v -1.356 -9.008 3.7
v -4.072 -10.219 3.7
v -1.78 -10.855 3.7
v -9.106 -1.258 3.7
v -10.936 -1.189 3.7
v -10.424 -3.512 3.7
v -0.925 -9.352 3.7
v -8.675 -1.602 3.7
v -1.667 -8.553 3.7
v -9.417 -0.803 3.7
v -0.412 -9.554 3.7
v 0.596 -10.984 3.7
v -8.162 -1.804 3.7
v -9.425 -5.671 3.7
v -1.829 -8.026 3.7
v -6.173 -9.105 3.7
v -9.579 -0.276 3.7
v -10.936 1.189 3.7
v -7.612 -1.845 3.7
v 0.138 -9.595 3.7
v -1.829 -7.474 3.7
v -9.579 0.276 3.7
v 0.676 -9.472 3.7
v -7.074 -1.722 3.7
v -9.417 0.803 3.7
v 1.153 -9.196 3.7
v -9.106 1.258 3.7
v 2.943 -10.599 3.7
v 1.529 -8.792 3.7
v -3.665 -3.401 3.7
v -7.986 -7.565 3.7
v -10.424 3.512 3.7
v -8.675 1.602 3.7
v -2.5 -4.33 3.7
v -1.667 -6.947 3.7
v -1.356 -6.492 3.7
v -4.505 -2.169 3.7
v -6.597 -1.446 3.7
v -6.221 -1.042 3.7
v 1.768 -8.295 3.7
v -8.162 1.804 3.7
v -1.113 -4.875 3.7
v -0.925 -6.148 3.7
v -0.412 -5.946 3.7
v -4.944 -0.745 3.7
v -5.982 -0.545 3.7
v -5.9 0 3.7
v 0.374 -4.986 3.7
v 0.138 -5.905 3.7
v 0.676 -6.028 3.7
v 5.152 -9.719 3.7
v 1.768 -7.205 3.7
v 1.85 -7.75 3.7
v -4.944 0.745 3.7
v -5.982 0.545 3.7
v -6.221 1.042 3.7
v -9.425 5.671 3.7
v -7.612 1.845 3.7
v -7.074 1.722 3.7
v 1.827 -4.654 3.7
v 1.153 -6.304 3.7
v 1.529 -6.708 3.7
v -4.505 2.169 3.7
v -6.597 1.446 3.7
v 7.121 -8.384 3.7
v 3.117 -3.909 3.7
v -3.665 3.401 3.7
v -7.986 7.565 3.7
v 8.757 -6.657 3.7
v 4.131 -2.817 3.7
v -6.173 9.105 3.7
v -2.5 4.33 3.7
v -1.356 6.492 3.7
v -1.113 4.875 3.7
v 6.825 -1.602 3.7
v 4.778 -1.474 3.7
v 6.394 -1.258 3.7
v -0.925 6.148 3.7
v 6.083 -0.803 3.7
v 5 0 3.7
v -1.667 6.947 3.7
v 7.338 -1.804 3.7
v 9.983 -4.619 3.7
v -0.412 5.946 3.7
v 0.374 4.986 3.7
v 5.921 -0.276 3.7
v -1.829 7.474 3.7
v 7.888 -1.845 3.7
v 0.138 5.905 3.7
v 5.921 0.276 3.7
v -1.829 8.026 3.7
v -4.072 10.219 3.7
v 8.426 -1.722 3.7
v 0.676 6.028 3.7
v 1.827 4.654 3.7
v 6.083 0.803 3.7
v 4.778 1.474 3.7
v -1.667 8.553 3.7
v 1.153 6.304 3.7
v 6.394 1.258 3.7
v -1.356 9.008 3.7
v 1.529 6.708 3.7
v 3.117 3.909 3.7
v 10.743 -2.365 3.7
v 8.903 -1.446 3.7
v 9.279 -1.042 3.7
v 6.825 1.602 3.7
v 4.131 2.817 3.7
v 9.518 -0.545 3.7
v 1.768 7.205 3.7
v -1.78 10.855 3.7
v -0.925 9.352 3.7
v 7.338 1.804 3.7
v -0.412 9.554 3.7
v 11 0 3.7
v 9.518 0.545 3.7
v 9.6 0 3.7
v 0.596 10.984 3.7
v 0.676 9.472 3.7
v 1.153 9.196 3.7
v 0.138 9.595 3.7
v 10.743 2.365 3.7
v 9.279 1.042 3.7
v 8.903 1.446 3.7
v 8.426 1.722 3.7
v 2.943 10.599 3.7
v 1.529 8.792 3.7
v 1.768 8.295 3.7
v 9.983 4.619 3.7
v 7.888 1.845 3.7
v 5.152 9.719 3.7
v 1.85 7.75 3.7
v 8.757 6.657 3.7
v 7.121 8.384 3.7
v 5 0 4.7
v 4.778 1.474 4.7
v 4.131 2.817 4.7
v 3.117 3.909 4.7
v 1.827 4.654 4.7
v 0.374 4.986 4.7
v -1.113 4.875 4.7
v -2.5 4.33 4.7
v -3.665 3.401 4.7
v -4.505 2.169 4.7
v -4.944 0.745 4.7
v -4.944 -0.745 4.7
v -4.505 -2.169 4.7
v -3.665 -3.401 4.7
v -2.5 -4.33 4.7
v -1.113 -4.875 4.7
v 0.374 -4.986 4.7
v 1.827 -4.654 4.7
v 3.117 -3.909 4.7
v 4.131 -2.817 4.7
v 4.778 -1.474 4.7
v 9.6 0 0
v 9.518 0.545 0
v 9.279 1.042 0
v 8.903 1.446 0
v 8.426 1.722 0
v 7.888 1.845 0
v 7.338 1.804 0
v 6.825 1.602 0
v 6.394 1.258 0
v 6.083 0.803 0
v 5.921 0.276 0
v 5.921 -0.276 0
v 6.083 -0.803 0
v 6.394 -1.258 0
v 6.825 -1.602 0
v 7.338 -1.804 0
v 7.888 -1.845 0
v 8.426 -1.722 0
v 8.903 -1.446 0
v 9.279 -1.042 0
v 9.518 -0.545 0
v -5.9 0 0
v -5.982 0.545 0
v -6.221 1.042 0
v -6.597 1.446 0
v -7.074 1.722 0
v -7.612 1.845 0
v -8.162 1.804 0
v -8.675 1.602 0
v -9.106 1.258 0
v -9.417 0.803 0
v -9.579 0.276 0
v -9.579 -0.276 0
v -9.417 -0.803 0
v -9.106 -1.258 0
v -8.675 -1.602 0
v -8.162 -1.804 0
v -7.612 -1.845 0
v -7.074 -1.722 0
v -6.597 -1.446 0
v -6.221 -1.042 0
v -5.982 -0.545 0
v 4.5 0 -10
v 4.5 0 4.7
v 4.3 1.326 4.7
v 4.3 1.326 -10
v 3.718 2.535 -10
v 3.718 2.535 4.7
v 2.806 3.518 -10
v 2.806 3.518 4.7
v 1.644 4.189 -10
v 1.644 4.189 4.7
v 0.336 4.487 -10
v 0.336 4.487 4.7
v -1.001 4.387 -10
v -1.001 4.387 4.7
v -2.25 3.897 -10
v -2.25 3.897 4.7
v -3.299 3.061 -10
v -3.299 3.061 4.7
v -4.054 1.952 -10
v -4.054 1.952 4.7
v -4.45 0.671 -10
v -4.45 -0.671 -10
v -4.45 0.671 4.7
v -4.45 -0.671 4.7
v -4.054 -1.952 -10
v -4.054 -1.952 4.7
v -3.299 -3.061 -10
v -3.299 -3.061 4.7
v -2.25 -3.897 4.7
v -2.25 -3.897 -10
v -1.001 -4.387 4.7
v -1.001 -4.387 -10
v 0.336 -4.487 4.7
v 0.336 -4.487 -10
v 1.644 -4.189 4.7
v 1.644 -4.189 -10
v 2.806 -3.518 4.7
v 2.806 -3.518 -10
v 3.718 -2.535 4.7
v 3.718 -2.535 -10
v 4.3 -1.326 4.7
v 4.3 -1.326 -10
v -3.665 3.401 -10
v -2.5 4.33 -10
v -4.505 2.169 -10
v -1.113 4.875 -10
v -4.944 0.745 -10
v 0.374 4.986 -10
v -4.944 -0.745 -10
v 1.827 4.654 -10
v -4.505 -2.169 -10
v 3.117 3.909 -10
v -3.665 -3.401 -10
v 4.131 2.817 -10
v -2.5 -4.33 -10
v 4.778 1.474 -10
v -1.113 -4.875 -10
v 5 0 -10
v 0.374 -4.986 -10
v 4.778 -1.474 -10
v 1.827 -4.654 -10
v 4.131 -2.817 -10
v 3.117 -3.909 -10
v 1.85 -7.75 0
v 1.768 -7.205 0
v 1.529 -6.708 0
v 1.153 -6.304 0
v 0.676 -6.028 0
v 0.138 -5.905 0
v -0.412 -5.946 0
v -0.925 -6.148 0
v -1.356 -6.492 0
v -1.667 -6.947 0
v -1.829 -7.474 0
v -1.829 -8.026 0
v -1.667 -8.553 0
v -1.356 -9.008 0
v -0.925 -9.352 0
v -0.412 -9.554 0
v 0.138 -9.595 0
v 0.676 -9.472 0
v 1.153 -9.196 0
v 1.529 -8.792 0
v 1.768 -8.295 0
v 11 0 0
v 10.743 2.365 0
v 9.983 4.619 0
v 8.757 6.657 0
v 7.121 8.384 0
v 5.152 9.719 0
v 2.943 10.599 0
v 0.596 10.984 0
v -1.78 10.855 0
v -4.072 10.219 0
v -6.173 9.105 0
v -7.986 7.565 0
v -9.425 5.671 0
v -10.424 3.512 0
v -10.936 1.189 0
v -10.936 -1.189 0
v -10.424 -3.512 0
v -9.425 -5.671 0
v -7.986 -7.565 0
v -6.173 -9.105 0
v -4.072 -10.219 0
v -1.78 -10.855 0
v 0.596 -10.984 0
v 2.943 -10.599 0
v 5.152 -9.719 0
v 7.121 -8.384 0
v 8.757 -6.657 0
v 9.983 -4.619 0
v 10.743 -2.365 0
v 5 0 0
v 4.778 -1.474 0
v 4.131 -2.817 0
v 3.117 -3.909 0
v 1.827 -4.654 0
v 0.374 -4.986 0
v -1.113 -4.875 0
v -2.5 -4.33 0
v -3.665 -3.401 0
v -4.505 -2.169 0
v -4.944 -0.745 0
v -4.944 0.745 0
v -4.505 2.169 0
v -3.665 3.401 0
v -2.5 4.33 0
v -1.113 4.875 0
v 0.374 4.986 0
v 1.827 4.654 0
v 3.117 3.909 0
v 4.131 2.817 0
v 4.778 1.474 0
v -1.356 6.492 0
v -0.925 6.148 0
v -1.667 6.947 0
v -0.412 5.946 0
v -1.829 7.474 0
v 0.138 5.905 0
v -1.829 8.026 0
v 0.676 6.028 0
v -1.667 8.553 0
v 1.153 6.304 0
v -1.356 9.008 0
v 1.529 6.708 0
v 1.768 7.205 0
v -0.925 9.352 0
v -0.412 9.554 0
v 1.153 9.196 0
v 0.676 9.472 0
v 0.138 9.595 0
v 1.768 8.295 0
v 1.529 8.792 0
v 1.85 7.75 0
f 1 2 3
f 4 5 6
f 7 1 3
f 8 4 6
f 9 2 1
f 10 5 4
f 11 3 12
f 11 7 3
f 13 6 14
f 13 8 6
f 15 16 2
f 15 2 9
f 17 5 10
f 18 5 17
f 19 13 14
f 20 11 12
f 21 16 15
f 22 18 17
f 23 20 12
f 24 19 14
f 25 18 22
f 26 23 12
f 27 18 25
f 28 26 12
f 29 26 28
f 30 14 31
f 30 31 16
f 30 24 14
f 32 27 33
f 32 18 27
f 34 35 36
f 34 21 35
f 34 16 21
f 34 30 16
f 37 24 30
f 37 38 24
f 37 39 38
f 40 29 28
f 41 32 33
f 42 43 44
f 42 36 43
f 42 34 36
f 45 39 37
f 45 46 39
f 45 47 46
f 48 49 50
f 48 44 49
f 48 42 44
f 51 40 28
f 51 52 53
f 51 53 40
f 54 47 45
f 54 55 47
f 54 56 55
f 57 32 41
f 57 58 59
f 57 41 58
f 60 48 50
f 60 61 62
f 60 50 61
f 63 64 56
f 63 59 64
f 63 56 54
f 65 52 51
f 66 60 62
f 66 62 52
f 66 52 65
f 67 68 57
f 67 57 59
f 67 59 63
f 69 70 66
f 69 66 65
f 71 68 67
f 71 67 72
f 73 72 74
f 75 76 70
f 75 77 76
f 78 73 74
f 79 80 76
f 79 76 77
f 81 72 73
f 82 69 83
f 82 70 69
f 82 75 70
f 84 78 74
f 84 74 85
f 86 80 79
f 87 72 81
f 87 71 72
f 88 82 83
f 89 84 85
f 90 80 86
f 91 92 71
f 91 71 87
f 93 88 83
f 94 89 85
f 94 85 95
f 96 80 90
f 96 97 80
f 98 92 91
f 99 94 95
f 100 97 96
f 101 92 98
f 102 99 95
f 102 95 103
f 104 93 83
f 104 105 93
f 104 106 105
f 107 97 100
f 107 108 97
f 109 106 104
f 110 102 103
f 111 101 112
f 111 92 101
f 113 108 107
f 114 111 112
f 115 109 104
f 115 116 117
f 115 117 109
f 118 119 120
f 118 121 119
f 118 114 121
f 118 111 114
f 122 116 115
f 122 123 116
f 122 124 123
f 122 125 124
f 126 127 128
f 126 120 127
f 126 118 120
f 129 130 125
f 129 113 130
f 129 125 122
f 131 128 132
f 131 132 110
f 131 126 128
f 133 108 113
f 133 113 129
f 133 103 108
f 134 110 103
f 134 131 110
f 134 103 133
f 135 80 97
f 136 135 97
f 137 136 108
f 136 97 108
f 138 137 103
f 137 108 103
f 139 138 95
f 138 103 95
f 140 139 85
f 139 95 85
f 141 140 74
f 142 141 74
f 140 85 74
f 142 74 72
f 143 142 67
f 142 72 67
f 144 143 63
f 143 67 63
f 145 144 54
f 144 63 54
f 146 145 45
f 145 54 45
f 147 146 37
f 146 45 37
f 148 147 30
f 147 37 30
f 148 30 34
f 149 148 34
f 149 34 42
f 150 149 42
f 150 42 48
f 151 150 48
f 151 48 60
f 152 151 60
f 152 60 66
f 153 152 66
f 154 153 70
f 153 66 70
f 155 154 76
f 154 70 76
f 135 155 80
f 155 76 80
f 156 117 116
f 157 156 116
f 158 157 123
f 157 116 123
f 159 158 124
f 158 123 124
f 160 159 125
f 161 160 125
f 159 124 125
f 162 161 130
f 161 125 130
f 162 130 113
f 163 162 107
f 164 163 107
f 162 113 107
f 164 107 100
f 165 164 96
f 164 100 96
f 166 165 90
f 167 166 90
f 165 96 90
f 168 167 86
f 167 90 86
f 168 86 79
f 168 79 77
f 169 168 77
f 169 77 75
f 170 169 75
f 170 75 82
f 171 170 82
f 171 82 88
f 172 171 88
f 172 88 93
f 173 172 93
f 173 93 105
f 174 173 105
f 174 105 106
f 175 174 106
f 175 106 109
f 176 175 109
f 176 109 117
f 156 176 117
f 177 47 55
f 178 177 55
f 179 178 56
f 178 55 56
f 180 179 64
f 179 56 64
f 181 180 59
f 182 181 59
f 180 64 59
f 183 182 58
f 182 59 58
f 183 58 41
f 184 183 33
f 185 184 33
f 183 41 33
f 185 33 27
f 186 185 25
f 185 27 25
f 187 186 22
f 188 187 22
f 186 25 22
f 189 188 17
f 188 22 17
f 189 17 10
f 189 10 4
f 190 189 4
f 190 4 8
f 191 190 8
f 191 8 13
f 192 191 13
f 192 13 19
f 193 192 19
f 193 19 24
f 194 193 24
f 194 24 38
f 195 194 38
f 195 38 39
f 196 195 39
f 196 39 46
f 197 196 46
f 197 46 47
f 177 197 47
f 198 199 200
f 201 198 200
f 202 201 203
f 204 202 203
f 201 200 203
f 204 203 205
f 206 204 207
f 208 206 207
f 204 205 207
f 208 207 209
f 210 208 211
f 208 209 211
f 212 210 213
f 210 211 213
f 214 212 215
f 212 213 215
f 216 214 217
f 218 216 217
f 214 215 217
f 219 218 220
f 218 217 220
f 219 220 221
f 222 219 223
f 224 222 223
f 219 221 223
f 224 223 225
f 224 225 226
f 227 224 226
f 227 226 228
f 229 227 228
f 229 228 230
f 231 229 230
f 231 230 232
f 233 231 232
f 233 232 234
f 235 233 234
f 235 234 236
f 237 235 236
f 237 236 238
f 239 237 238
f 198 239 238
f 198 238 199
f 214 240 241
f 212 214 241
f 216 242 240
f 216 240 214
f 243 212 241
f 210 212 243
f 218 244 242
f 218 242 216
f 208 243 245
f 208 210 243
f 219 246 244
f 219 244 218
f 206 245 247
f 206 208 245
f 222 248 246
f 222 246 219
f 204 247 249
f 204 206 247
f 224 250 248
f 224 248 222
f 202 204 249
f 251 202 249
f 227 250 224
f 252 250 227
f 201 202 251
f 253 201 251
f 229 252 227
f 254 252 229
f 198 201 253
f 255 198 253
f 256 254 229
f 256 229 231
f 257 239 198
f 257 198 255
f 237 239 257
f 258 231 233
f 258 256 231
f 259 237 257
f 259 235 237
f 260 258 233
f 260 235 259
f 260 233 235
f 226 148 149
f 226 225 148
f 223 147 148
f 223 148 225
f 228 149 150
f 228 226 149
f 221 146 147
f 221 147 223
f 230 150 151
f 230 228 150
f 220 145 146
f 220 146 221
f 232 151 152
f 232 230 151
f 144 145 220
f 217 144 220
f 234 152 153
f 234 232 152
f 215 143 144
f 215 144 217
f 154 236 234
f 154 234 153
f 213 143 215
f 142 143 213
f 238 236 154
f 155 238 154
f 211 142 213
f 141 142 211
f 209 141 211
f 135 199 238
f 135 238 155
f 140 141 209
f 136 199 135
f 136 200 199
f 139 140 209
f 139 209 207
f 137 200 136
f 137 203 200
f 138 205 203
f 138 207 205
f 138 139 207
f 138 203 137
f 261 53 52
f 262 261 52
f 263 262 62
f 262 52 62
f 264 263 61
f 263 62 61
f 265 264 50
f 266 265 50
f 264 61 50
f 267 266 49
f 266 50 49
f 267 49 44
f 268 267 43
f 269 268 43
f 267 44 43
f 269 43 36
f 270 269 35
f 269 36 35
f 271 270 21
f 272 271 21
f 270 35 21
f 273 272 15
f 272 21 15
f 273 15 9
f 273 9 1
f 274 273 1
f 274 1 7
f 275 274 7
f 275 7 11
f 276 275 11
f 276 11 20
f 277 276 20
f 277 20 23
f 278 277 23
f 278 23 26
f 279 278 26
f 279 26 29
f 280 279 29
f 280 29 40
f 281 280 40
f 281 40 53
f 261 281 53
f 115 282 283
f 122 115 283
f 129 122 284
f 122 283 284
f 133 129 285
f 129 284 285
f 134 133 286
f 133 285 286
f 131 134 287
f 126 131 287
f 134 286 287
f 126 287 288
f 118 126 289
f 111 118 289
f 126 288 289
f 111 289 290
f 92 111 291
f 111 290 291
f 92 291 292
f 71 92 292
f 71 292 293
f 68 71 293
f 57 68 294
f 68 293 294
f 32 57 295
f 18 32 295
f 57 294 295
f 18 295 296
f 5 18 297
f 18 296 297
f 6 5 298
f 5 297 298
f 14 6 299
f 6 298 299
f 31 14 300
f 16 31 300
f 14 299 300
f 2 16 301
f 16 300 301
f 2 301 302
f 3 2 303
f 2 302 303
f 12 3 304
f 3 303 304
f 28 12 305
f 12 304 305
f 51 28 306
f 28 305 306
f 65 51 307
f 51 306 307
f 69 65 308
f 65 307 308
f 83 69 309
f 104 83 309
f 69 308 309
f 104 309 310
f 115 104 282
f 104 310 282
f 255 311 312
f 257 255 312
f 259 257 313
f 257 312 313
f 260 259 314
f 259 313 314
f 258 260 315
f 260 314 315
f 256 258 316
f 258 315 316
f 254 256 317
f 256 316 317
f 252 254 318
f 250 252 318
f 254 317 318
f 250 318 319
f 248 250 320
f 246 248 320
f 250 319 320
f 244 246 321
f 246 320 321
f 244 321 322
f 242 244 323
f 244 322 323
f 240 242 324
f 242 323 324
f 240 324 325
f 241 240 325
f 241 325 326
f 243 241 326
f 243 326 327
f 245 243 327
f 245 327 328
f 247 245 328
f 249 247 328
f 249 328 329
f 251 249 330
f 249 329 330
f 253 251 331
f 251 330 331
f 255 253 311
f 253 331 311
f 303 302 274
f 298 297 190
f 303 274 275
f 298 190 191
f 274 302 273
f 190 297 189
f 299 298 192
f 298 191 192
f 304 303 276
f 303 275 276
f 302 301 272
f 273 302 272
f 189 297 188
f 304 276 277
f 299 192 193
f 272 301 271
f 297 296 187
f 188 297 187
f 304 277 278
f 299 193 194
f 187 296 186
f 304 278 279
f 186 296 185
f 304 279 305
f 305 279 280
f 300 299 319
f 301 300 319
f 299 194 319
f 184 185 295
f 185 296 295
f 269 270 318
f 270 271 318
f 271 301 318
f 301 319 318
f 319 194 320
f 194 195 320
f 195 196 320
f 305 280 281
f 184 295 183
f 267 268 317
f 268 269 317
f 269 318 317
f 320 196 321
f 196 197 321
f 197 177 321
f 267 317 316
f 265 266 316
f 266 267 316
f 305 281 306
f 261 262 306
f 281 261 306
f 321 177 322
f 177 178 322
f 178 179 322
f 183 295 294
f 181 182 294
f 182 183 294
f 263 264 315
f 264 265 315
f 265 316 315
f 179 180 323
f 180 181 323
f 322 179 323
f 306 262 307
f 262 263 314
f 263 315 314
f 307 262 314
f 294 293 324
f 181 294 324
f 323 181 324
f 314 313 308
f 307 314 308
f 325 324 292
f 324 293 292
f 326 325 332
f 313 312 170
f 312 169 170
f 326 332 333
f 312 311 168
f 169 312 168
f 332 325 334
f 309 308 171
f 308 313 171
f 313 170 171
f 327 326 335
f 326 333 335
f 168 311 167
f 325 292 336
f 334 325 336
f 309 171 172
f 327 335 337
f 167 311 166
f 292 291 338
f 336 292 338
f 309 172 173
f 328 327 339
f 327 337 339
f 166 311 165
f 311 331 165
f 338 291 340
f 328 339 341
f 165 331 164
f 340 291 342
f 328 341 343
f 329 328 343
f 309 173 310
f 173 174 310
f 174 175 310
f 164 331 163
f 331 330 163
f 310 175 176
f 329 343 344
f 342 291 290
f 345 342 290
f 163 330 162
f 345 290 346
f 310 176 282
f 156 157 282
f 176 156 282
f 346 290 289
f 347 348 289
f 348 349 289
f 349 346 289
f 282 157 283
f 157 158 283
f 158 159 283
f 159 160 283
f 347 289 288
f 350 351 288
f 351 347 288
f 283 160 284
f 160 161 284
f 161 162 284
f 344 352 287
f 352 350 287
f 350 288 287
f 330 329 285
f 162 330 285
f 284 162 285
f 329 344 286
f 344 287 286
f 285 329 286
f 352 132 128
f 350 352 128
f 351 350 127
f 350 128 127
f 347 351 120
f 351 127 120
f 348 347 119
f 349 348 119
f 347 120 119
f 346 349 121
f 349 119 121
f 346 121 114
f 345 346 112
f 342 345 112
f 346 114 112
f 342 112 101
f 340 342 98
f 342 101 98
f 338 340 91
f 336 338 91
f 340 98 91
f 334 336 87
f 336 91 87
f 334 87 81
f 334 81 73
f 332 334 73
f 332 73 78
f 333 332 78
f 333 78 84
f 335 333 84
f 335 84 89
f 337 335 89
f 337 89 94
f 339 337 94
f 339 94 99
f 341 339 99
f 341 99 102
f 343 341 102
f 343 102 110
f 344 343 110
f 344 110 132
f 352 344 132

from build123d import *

# Parameters (mm, degrees)
F0_R     = 11
F1_DEPTH = 3.7
F2_R     = 5
F3_DEPTH = 1
F4_R     = 5
F5_DEPTH = 10
F6_R     = 4.5
F7_DEPTH = 14.701
F8_R     = 1.85
F9_DEPTH = 13.701


with BuildPart() as f1:
    # F0 (on Top) → F1 (new body)
    with BuildSketch(Plane.XY):
        Circle(F0_R)
    extrude(amount=F1_DEPTH)

    # F2 (on face) → F3 (join)
    with BuildSketch(Plane.XY.offset(3.7)):
        Circle(F2_R)
    extrude(amount=F3_DEPTH)

    # F4 (on face) → F5 (join)
    with BuildSketch(Plane(origin=(0, 0, 0), x_dir=(1, 0, 0), z_dir=(0, 0, -1))):
        Circle(F4_R)
    extrude(amount=F5_DEPTH)

    # F6 (on face) → F7 (cut, through all)
    with BuildSketch(Plane.XY.offset(4.7)):
        Circle(F6_R)
    extrude(amount=-F7_DEPTH, mode=Mode.SUBTRACT)

    # F8 (on face) → F9 (cut, through all)
    with BuildSketch(Plane.XY.offset(3.7)):
        with Locations((0, 7.75)):
            Circle(F8_R)
        with Locations((-7.75, 0)):
            Circle(F8_R)
        with Locations((0, -7.75)):
            Circle(F8_R)
        with Locations((7.75, 0)):
            Circle(F8_R)
    extrude(amount=-F9_DEPTH, mode=Mode.SUBTRACT)


solid = f1.part
